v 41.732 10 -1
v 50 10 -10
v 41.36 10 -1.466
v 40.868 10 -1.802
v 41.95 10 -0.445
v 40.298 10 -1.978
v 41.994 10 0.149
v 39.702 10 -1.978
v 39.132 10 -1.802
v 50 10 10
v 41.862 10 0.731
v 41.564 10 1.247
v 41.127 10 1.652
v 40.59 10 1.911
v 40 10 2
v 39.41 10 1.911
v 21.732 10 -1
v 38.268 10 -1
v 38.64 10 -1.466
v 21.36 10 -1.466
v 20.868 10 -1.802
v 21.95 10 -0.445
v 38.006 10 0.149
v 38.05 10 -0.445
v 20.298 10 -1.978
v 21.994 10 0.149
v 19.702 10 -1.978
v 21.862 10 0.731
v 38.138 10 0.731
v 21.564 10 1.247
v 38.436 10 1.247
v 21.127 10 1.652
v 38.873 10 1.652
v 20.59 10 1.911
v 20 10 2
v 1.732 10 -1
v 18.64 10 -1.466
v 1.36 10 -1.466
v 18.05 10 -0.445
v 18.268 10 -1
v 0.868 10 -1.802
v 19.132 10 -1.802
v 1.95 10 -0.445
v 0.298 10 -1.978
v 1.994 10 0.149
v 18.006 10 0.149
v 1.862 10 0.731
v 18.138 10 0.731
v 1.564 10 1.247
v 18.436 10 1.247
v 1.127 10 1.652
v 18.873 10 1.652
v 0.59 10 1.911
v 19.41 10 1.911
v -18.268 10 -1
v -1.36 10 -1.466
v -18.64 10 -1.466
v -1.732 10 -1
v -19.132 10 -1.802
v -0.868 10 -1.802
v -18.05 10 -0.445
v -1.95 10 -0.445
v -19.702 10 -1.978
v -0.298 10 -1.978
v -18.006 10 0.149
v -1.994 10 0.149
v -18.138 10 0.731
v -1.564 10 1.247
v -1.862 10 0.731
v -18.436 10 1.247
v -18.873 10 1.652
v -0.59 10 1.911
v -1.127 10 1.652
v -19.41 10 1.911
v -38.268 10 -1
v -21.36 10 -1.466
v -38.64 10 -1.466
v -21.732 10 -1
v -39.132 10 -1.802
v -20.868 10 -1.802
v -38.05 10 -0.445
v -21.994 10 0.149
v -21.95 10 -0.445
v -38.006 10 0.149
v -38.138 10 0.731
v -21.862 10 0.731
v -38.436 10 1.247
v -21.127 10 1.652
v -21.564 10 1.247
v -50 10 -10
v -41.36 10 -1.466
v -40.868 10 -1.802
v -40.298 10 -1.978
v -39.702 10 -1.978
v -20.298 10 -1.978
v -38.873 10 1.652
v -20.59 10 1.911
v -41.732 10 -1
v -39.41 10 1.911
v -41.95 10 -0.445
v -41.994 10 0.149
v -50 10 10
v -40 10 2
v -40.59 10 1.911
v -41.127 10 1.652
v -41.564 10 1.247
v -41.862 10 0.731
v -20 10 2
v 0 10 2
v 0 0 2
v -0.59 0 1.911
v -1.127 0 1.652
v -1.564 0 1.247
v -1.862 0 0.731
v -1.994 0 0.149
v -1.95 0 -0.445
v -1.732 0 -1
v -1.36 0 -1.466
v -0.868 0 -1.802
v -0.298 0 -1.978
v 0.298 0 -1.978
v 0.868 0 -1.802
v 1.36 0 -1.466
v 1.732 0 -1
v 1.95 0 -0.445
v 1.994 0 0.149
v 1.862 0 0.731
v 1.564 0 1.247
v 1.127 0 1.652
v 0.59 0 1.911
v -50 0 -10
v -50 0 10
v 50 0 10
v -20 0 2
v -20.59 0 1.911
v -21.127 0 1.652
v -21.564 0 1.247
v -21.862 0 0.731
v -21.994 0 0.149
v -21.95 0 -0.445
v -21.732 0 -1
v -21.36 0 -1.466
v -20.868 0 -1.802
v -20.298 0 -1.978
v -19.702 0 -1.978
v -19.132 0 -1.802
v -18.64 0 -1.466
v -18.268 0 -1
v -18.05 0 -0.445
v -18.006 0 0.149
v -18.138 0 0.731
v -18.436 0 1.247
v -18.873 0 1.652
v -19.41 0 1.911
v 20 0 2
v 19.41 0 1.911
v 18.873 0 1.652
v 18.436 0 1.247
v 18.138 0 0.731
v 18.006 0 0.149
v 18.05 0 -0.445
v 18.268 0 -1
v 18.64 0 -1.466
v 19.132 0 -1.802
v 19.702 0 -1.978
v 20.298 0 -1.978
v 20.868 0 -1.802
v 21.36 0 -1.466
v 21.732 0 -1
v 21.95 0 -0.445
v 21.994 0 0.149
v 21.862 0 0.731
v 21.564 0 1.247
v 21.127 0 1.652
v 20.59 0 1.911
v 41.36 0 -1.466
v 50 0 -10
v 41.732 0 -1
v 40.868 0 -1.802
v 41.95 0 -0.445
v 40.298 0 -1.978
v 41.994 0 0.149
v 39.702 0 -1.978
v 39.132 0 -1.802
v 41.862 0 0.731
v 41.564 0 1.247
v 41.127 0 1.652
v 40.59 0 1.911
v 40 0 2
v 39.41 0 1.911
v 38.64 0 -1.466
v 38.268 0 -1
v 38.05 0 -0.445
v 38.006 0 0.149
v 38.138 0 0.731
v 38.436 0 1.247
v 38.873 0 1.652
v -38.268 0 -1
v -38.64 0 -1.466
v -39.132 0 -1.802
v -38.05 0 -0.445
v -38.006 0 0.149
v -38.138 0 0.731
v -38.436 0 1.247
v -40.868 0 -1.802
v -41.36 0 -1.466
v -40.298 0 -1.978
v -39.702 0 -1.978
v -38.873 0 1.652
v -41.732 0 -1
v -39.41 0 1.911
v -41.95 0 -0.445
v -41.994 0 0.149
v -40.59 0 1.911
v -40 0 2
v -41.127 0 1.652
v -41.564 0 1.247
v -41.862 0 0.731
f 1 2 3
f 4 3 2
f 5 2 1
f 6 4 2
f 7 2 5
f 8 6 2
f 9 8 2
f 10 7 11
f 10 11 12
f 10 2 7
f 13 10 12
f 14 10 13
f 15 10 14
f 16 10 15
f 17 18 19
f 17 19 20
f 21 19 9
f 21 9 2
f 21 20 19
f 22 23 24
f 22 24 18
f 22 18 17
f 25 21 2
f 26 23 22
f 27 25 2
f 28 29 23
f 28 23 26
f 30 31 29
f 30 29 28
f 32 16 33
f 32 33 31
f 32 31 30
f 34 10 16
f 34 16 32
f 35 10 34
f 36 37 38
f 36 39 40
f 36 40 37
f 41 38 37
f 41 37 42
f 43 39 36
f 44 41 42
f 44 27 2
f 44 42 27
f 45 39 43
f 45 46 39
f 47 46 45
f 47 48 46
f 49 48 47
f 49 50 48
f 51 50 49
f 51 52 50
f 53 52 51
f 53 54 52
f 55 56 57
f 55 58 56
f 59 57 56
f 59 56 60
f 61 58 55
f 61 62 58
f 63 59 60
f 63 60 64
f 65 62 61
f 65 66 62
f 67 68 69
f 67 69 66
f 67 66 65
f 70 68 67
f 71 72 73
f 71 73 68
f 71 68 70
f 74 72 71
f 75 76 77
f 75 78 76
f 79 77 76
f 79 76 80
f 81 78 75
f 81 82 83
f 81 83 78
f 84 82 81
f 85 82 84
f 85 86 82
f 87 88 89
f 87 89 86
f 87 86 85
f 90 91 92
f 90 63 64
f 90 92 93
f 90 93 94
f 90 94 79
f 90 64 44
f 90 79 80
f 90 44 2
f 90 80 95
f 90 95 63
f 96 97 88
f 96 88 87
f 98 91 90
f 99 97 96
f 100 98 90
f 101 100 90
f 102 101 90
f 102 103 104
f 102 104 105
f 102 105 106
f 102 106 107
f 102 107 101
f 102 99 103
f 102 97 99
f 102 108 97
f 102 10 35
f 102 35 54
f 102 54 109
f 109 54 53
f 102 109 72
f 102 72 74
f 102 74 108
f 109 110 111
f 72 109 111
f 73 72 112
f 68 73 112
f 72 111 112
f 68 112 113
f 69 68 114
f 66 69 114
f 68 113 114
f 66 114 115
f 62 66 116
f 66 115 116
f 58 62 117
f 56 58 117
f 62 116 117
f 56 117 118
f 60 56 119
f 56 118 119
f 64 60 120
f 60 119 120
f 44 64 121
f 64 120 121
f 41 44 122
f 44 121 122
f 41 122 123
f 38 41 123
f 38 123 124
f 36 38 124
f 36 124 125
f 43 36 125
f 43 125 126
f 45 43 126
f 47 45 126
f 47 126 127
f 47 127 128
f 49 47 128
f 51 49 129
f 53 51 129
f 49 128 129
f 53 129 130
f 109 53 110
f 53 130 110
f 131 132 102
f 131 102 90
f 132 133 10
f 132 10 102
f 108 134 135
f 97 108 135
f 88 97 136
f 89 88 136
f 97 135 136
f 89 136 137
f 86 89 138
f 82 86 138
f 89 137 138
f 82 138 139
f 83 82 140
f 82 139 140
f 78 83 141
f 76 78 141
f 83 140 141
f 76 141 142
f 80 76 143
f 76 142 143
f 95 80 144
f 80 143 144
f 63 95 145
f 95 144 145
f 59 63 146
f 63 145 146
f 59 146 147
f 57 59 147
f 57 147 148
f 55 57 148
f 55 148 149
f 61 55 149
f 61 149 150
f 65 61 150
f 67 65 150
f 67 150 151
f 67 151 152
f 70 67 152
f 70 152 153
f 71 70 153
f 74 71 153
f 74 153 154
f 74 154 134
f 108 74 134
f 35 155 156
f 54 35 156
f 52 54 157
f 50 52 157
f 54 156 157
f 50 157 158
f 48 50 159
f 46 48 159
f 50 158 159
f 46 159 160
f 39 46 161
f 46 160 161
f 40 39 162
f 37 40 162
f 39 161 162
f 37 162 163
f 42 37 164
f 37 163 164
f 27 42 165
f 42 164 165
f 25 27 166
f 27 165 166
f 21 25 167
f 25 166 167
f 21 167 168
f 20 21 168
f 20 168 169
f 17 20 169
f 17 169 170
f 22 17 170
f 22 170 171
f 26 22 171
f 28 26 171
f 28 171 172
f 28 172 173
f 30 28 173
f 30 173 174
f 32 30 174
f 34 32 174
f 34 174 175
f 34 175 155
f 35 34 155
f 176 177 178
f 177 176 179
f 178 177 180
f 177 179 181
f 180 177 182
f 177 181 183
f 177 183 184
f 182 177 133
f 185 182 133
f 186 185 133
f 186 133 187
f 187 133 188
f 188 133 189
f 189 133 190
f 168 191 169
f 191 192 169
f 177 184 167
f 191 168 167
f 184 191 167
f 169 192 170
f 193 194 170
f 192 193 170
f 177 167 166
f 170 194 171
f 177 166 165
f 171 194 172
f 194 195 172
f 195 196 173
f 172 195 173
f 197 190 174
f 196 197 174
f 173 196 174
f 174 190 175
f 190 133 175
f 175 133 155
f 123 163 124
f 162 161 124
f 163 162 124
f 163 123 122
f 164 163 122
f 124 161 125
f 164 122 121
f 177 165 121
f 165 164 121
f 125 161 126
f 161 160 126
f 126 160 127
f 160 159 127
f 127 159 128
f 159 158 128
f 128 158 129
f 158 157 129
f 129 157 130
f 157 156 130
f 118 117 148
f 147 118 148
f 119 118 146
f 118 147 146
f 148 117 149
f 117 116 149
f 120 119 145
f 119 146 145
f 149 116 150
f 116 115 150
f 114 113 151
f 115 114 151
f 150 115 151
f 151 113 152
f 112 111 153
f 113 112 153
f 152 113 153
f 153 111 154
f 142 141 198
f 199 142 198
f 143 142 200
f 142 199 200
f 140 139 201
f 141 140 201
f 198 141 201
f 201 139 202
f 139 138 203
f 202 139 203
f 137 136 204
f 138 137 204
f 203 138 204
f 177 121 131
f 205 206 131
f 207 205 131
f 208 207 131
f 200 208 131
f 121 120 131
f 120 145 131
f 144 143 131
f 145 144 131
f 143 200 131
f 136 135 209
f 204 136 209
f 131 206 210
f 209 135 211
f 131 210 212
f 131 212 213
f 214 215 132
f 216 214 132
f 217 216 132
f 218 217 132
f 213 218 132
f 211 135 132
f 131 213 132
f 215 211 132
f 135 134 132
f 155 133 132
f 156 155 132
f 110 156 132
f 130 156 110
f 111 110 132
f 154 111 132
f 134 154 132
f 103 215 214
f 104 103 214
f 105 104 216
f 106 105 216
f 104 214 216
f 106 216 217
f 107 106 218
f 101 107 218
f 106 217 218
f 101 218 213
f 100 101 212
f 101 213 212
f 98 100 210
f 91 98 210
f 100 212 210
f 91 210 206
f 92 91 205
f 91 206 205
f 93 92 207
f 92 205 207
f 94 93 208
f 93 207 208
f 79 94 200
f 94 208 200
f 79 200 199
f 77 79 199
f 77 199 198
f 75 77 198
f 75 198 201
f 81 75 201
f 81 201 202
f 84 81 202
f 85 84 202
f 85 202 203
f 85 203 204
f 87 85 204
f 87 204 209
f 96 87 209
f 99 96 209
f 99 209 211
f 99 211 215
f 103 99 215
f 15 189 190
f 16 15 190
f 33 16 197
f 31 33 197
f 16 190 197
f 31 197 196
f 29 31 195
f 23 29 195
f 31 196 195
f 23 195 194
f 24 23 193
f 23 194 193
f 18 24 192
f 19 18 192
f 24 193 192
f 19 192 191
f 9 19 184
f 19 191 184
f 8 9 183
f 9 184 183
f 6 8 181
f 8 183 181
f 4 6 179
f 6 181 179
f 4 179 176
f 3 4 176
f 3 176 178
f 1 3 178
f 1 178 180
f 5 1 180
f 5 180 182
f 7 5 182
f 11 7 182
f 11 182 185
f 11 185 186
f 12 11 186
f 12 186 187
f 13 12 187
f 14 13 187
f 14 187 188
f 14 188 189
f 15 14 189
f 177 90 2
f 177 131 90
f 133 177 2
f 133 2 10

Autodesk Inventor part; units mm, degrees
ref_plane "YZ Plane" through (0, 0, 0) normal (1, 0, 0) x (0, 1, 0)
ref_plane "XZ Plane" through (0, 0, 0) normal (0, 1, 0) x (-1, 0, 0)
ref_plane "XY Plane" through (0, 0, 0) normal (0, 0, 1) x (1, 0, 0)
sketch "Skizze1" plane through (0, 0, 0) normal (0, 1, 0) x (-1, 0, 0)
  line L0 (-50, 10) -> (50, 10)
  line L1 (50, 10) -> (50, -10)
  line L2 (50, -10) -> (-50, -10)
  line L3 (-50, -10) -> (-50, 10)
  line L4 (-50, 10) -> (50, -10) construction
  line L5 (50, 10) -> (-50, -10) construction
  point P0 (0, 0)
  dimension "d0" = 100
  dimension "d1" = 20
extrude "Extrusion1" add sketch "Skizze1" along normal blind 10
sketch "Skizze2" plane through (0, 10, 0) normal (0, 1, 0) x (1, 0, 0)
  line L0 (-70, 0) -> (70, 0) projected
  line L1 (-50, 10) -> (-50, -10) projected
  point P0 (0, 0)
  point P1 (-40, 0)
  point P2 (-20, 0)
  point P3 (0, 0)
  point P4 (20, 0)
  point P5 (40, 0)
  dimension "d4" = 10
  dimension "d7" = 20
hole "Bohrung1" at (-40, 10, 0) at (-20, 10, 0) at (0, 10, 0) at (20, 10, 0) at (40, 10, 0) direction (0, -1, 0) diameter 4 end through all
properties part number "Linear_rail"
